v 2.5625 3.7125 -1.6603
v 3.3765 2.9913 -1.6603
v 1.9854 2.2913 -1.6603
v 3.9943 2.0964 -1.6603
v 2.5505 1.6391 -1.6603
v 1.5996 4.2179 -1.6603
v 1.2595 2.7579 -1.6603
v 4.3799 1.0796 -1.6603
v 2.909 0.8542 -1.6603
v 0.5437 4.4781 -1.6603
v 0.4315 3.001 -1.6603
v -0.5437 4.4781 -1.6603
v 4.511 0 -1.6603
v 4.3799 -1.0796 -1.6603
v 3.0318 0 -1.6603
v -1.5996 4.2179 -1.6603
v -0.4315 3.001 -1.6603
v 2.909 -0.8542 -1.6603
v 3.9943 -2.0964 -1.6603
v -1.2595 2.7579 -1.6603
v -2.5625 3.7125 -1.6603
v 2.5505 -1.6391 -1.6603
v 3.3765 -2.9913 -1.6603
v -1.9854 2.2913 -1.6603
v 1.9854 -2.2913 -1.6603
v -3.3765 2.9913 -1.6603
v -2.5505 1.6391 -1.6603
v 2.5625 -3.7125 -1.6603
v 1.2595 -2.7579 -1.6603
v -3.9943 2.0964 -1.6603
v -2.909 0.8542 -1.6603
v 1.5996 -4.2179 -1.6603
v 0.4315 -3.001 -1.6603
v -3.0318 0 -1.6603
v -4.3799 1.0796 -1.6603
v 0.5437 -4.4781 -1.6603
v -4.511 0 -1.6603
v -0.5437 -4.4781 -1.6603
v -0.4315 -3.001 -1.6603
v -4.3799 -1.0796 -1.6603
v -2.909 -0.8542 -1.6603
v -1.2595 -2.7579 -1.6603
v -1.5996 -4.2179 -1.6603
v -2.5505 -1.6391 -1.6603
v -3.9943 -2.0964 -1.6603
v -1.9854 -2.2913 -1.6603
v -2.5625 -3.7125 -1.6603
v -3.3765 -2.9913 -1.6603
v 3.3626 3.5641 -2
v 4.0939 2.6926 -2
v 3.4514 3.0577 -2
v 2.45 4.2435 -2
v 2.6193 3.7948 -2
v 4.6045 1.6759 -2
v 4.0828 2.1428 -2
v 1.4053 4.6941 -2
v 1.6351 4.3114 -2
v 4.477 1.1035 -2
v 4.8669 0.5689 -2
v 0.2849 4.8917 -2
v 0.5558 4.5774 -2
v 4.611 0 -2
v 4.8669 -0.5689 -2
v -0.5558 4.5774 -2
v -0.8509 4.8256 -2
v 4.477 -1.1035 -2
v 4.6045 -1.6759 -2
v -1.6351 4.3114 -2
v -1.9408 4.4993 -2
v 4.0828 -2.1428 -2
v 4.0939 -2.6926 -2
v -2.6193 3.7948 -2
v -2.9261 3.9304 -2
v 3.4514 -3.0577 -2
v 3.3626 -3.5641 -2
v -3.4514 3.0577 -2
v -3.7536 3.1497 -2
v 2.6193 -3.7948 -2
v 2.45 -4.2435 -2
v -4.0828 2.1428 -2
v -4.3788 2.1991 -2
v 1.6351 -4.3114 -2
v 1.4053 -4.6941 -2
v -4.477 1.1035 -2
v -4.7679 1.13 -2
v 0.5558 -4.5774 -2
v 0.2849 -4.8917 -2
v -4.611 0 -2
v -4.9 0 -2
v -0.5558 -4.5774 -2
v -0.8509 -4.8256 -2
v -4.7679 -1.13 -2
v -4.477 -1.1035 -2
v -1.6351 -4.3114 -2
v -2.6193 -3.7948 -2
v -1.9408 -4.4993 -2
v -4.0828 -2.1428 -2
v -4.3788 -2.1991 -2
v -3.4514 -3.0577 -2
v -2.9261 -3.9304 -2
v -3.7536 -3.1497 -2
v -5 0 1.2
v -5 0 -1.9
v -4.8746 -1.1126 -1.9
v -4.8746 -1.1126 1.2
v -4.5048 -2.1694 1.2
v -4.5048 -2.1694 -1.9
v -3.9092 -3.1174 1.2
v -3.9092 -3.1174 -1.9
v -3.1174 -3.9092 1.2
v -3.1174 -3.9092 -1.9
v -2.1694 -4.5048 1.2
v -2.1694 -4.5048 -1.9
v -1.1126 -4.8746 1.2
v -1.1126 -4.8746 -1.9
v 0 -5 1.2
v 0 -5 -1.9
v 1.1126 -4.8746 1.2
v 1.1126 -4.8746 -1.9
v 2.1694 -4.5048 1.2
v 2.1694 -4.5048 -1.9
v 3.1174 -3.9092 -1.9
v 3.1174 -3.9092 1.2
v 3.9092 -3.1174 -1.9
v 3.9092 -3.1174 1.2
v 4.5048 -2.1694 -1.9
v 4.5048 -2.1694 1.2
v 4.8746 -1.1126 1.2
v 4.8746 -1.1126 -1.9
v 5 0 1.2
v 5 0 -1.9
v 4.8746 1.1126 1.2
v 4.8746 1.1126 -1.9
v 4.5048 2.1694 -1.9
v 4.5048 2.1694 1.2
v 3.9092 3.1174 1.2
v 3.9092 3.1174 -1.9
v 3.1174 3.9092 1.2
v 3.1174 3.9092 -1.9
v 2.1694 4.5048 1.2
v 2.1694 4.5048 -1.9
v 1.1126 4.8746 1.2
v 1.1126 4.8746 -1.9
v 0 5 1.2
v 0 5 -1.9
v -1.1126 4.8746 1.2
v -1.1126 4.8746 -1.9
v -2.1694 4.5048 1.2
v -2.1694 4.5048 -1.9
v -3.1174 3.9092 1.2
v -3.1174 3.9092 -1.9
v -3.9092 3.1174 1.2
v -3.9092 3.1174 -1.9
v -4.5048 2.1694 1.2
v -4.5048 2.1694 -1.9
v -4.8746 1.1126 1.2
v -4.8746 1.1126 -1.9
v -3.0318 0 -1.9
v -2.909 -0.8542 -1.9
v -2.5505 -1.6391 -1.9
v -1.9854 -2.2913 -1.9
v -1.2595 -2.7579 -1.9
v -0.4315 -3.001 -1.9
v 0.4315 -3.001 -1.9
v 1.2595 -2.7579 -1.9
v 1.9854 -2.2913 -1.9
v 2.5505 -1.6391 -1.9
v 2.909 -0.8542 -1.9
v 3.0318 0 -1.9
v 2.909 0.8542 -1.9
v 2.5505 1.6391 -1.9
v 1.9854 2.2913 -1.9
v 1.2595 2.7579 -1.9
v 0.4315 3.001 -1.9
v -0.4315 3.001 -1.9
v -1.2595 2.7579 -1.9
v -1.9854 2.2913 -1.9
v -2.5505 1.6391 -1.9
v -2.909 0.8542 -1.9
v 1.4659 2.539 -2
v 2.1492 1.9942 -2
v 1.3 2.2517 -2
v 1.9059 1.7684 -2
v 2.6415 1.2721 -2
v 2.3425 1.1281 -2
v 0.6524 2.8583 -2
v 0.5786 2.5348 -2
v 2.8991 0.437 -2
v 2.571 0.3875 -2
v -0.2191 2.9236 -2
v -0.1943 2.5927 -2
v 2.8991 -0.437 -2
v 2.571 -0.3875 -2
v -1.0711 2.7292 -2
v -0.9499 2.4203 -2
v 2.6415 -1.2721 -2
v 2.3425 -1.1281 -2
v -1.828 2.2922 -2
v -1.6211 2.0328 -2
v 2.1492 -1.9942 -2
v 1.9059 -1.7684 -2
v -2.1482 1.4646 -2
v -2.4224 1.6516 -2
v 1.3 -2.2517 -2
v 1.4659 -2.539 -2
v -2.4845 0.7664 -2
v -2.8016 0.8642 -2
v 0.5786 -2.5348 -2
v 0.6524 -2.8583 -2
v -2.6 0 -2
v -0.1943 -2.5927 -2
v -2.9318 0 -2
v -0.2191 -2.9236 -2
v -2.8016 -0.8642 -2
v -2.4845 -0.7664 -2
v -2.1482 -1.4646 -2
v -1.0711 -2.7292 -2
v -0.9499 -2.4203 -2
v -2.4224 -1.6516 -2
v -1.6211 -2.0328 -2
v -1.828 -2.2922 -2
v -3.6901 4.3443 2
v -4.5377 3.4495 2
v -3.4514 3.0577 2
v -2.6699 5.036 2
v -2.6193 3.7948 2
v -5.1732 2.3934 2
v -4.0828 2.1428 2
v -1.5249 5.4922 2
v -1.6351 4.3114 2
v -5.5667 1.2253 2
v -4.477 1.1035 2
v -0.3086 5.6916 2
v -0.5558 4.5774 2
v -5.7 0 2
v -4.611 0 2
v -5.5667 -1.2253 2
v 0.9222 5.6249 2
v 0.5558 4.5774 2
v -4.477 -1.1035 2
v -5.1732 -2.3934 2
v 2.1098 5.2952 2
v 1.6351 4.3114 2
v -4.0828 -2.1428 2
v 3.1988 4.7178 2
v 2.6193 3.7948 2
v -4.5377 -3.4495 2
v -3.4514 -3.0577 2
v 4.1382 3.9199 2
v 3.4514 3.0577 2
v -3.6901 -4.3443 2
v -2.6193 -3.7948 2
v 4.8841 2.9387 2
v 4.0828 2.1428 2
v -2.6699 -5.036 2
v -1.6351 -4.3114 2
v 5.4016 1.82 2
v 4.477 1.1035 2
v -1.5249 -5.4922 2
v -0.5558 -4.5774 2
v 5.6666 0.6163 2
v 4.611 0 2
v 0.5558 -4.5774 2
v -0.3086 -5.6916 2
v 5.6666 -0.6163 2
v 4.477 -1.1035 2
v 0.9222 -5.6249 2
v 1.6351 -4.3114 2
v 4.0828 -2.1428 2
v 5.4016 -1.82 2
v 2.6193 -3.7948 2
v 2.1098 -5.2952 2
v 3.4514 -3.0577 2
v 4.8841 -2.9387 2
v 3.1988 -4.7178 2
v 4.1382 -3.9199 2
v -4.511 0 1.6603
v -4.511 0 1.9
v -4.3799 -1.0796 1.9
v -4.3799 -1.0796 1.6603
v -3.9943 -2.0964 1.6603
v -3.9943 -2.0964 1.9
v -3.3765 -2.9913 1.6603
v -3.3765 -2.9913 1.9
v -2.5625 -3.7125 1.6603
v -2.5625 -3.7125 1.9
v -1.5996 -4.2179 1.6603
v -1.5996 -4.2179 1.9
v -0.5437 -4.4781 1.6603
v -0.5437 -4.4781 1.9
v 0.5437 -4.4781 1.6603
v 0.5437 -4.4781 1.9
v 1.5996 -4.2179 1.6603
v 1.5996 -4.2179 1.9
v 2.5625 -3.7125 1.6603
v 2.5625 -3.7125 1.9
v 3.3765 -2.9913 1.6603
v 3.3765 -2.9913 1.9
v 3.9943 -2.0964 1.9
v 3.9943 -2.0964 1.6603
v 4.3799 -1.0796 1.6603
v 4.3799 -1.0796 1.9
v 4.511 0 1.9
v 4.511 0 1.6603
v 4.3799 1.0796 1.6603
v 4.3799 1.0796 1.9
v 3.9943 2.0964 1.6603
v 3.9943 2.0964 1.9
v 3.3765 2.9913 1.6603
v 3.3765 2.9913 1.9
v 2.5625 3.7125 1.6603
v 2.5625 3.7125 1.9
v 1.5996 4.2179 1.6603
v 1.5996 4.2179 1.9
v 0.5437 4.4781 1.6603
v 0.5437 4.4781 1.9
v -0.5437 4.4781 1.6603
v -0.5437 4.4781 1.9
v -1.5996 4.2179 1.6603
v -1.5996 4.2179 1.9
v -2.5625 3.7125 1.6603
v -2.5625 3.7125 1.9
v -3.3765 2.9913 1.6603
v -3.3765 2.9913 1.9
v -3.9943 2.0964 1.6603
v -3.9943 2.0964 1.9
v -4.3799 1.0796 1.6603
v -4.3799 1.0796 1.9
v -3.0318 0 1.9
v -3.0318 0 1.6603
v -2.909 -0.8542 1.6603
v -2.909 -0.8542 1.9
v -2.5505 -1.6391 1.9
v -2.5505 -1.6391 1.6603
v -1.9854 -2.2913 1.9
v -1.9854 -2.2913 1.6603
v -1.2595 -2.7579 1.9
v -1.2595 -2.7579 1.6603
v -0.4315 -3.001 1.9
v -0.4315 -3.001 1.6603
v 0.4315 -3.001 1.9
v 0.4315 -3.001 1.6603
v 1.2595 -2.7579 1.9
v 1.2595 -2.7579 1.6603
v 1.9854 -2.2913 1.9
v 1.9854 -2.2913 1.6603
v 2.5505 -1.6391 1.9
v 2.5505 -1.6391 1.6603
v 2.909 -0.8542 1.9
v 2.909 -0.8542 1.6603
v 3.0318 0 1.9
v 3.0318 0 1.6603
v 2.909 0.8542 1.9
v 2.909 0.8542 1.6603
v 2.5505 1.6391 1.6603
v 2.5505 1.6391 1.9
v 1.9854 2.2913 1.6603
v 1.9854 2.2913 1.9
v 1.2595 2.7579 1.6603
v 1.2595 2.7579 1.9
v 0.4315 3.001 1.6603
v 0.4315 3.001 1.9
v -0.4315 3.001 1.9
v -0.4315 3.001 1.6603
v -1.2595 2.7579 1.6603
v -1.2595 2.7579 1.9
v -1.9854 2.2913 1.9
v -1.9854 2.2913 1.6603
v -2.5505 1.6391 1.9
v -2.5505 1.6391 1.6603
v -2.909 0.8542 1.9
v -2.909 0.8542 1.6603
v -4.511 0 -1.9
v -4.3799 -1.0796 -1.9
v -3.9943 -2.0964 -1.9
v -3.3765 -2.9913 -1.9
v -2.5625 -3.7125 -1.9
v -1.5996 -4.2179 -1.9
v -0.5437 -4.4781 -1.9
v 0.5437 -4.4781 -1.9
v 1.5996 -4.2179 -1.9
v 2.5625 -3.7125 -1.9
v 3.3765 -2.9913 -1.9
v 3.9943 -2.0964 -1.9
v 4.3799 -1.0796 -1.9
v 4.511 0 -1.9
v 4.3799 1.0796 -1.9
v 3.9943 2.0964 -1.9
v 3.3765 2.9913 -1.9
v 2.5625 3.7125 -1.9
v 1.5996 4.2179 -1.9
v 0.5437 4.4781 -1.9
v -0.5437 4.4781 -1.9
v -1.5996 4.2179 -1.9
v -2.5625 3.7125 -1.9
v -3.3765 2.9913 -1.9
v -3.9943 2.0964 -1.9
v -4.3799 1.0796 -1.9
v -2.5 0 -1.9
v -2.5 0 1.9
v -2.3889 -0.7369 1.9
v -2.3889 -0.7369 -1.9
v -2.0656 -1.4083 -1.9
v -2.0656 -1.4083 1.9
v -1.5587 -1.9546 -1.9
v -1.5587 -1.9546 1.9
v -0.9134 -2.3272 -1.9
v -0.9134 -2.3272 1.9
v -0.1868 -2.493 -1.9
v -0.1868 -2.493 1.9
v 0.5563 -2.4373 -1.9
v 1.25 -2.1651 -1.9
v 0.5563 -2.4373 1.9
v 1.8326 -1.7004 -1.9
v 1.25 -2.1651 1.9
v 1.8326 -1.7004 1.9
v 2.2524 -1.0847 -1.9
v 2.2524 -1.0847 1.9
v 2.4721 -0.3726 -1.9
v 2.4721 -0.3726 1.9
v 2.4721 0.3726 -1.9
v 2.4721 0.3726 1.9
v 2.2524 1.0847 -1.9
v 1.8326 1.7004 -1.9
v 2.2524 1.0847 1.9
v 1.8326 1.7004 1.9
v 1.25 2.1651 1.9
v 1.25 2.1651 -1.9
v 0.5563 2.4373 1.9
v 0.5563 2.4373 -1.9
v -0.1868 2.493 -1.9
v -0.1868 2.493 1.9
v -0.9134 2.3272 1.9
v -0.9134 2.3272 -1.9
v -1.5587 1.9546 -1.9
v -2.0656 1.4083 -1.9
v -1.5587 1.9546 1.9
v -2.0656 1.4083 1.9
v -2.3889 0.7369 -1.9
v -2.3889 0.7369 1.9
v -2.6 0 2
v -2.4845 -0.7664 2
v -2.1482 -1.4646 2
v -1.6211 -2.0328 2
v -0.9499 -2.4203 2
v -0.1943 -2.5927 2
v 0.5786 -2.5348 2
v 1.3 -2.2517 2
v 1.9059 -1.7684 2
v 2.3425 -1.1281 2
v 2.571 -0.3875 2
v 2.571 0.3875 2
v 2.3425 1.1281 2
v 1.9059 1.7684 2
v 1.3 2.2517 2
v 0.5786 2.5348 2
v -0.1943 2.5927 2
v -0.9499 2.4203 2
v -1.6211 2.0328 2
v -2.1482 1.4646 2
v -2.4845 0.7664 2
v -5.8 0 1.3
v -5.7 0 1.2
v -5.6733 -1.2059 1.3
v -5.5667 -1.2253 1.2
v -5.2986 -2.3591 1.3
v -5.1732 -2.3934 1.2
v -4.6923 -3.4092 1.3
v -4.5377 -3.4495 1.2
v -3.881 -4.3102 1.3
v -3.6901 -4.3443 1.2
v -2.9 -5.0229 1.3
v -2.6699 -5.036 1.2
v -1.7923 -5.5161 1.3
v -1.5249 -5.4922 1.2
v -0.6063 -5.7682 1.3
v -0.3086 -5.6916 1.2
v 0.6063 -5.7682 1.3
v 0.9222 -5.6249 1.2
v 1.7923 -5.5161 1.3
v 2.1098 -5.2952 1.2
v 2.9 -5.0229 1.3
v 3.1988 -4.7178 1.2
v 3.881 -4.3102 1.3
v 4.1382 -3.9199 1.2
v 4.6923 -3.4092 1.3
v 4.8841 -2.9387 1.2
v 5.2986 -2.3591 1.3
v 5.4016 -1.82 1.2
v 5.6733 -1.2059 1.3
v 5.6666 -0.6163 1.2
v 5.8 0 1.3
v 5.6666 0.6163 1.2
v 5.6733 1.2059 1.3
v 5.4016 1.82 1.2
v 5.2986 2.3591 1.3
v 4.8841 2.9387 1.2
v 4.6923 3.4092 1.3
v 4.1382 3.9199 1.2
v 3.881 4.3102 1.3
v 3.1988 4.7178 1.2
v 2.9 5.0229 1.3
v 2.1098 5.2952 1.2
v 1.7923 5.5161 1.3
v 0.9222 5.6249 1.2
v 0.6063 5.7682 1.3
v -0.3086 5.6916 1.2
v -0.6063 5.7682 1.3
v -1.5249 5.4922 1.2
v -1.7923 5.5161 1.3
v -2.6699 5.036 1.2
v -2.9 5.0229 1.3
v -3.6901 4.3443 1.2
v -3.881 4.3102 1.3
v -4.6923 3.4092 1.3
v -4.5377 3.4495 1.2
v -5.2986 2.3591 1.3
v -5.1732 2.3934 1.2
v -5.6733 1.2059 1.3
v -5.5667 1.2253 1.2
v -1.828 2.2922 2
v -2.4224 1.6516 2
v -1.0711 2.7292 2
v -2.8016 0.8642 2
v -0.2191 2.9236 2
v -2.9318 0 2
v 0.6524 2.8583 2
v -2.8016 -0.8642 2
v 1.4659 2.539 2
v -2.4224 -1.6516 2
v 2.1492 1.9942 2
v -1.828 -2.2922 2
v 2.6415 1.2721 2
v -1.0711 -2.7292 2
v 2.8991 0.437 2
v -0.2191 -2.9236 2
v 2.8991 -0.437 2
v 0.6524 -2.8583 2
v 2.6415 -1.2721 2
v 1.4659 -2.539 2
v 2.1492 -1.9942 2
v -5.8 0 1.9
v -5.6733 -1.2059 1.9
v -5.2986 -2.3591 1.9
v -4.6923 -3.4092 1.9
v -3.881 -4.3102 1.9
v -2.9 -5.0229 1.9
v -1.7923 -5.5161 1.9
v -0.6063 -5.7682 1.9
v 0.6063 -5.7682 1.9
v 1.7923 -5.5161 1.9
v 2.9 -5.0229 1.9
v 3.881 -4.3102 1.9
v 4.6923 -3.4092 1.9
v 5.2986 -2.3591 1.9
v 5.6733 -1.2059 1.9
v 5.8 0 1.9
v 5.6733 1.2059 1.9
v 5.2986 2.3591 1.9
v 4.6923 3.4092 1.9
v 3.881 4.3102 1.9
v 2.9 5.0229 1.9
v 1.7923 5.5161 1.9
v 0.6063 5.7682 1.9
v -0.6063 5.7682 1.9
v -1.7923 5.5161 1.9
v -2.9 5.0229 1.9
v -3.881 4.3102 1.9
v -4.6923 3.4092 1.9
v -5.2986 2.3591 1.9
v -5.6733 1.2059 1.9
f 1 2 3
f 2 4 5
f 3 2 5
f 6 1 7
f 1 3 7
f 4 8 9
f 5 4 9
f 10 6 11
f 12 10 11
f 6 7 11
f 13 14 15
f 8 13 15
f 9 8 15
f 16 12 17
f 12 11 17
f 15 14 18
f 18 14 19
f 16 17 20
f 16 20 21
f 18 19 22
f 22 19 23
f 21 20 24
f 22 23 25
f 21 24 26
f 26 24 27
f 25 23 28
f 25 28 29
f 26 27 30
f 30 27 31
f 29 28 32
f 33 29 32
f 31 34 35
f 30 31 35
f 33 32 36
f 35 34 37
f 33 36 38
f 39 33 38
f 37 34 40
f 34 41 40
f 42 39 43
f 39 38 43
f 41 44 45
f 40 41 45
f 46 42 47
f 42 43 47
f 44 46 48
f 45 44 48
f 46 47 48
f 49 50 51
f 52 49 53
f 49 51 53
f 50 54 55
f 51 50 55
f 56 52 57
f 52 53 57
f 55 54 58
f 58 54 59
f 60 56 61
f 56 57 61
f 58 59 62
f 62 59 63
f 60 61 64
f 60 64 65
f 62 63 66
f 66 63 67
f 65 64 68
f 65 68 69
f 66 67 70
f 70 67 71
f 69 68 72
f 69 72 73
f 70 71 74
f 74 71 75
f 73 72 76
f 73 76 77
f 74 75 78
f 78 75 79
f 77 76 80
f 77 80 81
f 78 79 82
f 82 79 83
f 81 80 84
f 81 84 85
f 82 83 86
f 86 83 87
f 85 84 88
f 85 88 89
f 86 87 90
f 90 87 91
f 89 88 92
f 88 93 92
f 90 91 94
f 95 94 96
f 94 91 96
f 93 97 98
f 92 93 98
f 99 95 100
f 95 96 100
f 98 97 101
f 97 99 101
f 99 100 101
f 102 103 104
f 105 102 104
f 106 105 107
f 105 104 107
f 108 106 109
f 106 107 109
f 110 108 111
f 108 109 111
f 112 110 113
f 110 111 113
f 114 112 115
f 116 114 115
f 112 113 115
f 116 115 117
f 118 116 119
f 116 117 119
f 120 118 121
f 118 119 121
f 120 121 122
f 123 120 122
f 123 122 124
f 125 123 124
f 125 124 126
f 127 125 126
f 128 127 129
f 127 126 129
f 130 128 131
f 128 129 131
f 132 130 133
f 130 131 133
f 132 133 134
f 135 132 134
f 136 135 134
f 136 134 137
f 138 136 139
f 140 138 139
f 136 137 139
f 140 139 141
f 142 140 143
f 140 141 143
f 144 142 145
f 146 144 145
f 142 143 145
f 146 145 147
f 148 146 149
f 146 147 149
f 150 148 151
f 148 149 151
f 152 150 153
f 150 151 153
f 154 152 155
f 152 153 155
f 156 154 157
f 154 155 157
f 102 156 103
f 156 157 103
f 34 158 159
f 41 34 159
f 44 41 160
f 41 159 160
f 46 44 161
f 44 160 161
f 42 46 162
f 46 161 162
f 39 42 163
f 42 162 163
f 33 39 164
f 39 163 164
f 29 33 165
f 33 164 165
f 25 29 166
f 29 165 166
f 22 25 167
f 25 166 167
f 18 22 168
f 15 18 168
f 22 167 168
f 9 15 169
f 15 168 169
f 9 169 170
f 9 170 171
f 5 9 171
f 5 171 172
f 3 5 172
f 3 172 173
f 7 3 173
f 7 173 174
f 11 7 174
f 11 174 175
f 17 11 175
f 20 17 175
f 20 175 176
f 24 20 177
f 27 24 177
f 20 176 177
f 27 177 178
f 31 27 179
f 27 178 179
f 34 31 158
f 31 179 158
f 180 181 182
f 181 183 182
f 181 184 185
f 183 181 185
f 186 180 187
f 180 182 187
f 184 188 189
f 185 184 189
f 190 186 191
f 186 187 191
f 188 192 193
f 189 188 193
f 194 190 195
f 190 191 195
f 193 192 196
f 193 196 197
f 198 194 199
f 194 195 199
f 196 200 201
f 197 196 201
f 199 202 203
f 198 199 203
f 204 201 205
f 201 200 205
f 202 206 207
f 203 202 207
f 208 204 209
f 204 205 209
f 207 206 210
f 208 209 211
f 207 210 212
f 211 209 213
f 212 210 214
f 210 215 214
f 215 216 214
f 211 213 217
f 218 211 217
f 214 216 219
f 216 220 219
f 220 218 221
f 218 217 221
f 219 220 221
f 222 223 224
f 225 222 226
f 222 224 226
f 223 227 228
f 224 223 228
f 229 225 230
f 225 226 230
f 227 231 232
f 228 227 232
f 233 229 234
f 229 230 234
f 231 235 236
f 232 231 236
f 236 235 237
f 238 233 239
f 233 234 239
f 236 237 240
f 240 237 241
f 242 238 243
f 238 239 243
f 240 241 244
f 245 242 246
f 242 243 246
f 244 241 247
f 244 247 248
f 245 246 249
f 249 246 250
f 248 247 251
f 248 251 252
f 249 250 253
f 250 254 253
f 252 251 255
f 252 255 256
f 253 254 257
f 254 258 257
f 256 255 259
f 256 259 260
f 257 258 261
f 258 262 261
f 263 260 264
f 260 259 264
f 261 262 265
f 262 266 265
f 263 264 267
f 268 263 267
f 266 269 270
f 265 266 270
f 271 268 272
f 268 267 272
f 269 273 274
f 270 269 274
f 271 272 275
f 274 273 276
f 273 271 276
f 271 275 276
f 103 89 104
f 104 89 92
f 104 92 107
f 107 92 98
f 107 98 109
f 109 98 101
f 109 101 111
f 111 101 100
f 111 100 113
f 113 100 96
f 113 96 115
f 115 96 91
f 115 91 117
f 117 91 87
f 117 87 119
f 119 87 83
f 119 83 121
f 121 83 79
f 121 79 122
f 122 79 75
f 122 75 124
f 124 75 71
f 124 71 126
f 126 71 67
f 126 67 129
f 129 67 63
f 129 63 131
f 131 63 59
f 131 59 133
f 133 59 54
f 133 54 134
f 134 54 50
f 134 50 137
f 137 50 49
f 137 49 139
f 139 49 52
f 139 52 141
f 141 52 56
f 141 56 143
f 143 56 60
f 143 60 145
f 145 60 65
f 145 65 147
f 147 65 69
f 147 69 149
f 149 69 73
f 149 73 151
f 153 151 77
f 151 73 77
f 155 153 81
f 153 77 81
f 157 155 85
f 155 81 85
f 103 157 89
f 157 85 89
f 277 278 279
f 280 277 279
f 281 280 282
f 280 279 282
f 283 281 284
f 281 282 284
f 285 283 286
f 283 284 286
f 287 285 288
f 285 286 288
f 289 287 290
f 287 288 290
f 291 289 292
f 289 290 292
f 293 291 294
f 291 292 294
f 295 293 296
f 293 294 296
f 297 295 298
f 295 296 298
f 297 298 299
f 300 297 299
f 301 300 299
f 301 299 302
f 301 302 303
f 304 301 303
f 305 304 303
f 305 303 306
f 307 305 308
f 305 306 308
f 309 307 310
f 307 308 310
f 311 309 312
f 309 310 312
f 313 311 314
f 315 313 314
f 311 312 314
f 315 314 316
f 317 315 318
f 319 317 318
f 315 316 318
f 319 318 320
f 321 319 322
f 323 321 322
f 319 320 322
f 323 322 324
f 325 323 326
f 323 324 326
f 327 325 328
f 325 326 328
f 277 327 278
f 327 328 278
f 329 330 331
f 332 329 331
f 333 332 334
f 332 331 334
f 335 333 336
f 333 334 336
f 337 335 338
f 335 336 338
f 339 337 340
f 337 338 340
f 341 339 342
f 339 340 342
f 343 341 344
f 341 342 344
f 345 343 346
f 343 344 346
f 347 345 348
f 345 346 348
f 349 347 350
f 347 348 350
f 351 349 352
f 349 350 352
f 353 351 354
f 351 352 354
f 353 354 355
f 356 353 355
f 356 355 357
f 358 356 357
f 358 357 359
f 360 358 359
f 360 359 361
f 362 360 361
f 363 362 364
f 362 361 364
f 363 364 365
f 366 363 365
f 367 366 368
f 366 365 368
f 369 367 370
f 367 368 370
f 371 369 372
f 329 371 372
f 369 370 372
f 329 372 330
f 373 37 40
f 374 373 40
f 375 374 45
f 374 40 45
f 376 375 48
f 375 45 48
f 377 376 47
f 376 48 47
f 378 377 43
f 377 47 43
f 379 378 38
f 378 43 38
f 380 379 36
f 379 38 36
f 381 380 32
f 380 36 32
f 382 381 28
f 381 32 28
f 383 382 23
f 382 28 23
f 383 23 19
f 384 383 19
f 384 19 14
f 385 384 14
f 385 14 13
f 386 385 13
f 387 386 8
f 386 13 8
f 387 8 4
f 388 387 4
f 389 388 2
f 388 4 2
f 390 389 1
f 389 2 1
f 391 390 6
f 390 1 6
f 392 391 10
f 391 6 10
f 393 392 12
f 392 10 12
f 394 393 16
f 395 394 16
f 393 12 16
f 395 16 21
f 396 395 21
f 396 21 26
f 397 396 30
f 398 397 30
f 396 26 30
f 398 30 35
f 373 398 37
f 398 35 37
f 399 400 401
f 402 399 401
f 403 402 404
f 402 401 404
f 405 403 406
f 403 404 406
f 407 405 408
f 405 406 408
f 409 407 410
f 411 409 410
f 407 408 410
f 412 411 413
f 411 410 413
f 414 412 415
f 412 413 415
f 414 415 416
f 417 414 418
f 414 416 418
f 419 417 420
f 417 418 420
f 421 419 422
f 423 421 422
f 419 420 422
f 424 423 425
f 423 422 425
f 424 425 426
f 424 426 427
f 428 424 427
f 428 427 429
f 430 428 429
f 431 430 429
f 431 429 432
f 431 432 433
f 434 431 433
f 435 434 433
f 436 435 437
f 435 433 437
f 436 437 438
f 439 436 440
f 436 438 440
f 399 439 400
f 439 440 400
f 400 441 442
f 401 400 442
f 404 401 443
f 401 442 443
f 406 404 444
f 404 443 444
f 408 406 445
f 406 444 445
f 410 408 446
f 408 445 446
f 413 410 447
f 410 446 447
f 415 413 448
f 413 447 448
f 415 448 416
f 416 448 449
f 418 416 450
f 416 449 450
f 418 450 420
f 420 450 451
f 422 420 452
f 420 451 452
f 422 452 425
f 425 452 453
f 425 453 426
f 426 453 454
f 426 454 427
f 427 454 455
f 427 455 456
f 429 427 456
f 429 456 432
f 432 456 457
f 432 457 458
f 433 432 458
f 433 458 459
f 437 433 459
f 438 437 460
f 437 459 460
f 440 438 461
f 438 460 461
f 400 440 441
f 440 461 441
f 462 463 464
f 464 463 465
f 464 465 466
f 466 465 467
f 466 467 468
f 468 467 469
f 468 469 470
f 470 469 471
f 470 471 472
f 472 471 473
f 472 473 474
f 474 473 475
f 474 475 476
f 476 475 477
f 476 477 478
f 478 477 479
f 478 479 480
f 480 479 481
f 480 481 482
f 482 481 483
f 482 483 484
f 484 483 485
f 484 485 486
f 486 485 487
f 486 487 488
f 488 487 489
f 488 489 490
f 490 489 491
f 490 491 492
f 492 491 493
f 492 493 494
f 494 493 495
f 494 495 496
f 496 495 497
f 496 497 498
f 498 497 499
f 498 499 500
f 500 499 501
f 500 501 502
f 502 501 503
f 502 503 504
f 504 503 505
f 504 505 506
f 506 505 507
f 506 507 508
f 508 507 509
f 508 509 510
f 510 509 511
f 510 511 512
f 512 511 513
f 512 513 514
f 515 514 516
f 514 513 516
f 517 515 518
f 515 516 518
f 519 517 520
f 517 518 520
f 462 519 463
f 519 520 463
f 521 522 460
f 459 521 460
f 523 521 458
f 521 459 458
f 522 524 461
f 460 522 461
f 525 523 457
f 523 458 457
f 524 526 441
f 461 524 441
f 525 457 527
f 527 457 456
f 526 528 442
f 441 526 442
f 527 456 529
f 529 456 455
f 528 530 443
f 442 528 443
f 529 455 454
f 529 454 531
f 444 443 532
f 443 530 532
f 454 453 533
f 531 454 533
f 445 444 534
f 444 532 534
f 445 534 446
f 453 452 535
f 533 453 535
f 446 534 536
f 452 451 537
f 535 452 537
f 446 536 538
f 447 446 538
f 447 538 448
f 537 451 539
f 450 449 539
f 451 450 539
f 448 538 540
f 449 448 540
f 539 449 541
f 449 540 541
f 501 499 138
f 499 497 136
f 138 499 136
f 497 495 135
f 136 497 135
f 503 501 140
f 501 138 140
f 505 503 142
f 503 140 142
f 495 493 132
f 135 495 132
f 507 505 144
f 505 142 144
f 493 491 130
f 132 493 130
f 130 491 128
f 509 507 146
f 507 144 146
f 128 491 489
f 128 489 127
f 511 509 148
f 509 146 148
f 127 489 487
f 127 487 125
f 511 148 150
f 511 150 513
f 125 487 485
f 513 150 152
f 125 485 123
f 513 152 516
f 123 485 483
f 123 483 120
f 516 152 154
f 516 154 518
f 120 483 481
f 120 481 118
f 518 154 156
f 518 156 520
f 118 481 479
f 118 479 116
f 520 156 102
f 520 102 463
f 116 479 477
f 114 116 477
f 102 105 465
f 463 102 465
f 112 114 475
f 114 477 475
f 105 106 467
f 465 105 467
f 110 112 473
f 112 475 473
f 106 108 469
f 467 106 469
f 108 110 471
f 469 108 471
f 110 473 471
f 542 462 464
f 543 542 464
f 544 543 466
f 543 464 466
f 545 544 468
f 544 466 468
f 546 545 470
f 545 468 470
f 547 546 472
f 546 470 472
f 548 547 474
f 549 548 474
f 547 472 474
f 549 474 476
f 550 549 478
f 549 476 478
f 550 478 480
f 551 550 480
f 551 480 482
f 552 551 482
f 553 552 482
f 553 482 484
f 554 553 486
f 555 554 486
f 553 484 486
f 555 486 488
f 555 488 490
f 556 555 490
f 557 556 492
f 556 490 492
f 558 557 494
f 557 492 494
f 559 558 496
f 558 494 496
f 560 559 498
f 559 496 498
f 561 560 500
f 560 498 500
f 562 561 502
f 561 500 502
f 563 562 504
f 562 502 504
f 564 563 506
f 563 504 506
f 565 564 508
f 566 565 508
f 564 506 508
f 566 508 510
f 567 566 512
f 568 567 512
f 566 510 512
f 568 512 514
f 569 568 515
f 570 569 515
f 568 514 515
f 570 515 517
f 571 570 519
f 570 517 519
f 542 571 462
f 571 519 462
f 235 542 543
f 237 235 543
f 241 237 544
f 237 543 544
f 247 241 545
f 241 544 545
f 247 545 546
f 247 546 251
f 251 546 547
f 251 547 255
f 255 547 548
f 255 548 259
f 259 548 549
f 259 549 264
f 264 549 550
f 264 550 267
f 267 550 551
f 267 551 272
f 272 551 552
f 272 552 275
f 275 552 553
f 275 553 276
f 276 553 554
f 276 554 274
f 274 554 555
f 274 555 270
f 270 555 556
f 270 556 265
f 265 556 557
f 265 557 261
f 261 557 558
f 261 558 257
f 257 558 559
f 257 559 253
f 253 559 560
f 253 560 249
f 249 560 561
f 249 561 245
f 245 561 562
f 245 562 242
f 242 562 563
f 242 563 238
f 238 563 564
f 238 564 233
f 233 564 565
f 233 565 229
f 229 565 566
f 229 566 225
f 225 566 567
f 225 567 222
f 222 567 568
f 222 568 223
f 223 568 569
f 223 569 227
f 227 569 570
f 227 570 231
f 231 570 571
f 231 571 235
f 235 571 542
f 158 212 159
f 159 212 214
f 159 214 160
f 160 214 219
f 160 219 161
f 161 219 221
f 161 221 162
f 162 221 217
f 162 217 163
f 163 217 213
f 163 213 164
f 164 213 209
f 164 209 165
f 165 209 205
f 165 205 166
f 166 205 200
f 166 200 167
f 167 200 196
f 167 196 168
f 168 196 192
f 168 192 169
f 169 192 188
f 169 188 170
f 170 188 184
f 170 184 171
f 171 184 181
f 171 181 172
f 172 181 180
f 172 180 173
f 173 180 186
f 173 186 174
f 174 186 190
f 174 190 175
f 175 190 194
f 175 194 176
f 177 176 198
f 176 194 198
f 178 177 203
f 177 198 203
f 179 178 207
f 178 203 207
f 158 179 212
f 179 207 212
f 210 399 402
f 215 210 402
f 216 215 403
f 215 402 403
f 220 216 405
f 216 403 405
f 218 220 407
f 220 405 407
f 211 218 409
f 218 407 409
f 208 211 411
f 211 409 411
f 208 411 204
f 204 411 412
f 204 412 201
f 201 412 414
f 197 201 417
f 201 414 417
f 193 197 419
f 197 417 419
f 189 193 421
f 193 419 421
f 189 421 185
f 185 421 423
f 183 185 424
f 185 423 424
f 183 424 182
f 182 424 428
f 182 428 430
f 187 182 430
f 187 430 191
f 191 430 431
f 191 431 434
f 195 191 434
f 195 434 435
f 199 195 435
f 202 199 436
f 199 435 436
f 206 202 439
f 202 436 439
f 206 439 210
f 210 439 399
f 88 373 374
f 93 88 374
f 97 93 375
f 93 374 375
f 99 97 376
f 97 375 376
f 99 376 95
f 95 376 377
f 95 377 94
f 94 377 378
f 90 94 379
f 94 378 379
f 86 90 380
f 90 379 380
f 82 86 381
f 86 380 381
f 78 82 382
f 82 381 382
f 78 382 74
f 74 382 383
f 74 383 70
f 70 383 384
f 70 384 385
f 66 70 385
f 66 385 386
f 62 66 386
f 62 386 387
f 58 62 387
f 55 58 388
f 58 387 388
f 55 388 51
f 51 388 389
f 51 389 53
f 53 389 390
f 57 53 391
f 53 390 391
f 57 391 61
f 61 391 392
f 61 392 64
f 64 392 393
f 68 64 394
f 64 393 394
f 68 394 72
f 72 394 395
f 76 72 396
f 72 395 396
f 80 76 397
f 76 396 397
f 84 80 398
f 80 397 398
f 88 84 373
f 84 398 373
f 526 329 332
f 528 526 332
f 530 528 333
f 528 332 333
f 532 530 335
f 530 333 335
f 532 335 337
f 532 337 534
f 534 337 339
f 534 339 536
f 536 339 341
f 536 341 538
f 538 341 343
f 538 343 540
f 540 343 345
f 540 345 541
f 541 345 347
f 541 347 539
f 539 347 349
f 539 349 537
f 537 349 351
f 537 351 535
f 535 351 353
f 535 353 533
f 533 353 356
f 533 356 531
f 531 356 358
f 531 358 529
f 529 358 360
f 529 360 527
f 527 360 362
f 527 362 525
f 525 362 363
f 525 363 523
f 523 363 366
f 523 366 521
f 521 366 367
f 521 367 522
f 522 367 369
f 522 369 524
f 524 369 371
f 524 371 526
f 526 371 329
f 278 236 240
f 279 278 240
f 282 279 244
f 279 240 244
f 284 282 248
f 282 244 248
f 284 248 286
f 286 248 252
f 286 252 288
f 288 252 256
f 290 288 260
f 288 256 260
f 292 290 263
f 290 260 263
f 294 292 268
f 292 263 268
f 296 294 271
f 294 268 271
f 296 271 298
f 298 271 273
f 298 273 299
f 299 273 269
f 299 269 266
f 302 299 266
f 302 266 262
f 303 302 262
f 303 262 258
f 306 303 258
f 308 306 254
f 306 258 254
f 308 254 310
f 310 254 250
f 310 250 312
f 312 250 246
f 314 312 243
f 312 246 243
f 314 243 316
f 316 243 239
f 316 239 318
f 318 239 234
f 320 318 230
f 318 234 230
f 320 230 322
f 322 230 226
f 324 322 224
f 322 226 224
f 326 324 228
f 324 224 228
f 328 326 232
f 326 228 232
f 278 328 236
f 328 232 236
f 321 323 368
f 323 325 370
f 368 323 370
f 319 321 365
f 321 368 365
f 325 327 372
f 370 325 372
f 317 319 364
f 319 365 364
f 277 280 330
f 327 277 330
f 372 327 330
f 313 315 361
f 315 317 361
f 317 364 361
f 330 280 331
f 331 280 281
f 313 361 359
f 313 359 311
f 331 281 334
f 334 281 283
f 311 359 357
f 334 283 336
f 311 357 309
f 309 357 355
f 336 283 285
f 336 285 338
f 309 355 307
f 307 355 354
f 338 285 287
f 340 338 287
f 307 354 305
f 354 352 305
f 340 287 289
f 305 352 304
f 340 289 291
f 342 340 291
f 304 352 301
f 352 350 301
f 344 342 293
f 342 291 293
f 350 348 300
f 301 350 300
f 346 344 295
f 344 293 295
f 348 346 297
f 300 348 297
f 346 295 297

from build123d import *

# Parameters (mm, degrees)
CHAMFER1_SIZE = 0.1


with BuildPart() as part:
    # Sketch1 → Revolve1 (revolve)
    with BuildSketch(Plane(origin=(0, 0, 0), x_dir=(0, 0, -1), z_dir=(1, 0, 0)), mode=Mode.PRIVATE) as revolve1_sk:
        Polygon((-1.2, 5), (2, 5), (2, 4.510995713), (1.660325371, 4.510995713), (1.660325371, 3.031838511), (2, 3.031838511), (2, 2.5), (-2, 2.5), (-2, 3.031838511), (-1.660325371, 3.031838511), (-1.660325371, 4.510995713), (-2, 4.510995713), (-2, 5.8), (-1.2, 5.8), align=None)
    revolve(revolve1_sk.sketch.rotate(Axis((0, 0, -19.078271996), (0, 0, 1)), 90), axis=Axis((0, 0, -19.078271996), (0, 0, 1)))

    # Chamfer1
    chamfer1_edges = [part.edges().sort_by_distance(p)[0] for p in [
        (3.031838511, 0, 2),
        (4.510995713, 0, 2),
        (5.8, 0, 2),
        (5.8, 0, 1.2),
        (5, 0, -2),
        (4.510995713, 0, -2),
        (3.031838511, 0, -2),
        (2.5, 0, -2),
        (2.5, 0, 2),
    ]]
    chamfer(chamfer1_edges, length=CHAMFER1_SIZE)


solid = part.part
